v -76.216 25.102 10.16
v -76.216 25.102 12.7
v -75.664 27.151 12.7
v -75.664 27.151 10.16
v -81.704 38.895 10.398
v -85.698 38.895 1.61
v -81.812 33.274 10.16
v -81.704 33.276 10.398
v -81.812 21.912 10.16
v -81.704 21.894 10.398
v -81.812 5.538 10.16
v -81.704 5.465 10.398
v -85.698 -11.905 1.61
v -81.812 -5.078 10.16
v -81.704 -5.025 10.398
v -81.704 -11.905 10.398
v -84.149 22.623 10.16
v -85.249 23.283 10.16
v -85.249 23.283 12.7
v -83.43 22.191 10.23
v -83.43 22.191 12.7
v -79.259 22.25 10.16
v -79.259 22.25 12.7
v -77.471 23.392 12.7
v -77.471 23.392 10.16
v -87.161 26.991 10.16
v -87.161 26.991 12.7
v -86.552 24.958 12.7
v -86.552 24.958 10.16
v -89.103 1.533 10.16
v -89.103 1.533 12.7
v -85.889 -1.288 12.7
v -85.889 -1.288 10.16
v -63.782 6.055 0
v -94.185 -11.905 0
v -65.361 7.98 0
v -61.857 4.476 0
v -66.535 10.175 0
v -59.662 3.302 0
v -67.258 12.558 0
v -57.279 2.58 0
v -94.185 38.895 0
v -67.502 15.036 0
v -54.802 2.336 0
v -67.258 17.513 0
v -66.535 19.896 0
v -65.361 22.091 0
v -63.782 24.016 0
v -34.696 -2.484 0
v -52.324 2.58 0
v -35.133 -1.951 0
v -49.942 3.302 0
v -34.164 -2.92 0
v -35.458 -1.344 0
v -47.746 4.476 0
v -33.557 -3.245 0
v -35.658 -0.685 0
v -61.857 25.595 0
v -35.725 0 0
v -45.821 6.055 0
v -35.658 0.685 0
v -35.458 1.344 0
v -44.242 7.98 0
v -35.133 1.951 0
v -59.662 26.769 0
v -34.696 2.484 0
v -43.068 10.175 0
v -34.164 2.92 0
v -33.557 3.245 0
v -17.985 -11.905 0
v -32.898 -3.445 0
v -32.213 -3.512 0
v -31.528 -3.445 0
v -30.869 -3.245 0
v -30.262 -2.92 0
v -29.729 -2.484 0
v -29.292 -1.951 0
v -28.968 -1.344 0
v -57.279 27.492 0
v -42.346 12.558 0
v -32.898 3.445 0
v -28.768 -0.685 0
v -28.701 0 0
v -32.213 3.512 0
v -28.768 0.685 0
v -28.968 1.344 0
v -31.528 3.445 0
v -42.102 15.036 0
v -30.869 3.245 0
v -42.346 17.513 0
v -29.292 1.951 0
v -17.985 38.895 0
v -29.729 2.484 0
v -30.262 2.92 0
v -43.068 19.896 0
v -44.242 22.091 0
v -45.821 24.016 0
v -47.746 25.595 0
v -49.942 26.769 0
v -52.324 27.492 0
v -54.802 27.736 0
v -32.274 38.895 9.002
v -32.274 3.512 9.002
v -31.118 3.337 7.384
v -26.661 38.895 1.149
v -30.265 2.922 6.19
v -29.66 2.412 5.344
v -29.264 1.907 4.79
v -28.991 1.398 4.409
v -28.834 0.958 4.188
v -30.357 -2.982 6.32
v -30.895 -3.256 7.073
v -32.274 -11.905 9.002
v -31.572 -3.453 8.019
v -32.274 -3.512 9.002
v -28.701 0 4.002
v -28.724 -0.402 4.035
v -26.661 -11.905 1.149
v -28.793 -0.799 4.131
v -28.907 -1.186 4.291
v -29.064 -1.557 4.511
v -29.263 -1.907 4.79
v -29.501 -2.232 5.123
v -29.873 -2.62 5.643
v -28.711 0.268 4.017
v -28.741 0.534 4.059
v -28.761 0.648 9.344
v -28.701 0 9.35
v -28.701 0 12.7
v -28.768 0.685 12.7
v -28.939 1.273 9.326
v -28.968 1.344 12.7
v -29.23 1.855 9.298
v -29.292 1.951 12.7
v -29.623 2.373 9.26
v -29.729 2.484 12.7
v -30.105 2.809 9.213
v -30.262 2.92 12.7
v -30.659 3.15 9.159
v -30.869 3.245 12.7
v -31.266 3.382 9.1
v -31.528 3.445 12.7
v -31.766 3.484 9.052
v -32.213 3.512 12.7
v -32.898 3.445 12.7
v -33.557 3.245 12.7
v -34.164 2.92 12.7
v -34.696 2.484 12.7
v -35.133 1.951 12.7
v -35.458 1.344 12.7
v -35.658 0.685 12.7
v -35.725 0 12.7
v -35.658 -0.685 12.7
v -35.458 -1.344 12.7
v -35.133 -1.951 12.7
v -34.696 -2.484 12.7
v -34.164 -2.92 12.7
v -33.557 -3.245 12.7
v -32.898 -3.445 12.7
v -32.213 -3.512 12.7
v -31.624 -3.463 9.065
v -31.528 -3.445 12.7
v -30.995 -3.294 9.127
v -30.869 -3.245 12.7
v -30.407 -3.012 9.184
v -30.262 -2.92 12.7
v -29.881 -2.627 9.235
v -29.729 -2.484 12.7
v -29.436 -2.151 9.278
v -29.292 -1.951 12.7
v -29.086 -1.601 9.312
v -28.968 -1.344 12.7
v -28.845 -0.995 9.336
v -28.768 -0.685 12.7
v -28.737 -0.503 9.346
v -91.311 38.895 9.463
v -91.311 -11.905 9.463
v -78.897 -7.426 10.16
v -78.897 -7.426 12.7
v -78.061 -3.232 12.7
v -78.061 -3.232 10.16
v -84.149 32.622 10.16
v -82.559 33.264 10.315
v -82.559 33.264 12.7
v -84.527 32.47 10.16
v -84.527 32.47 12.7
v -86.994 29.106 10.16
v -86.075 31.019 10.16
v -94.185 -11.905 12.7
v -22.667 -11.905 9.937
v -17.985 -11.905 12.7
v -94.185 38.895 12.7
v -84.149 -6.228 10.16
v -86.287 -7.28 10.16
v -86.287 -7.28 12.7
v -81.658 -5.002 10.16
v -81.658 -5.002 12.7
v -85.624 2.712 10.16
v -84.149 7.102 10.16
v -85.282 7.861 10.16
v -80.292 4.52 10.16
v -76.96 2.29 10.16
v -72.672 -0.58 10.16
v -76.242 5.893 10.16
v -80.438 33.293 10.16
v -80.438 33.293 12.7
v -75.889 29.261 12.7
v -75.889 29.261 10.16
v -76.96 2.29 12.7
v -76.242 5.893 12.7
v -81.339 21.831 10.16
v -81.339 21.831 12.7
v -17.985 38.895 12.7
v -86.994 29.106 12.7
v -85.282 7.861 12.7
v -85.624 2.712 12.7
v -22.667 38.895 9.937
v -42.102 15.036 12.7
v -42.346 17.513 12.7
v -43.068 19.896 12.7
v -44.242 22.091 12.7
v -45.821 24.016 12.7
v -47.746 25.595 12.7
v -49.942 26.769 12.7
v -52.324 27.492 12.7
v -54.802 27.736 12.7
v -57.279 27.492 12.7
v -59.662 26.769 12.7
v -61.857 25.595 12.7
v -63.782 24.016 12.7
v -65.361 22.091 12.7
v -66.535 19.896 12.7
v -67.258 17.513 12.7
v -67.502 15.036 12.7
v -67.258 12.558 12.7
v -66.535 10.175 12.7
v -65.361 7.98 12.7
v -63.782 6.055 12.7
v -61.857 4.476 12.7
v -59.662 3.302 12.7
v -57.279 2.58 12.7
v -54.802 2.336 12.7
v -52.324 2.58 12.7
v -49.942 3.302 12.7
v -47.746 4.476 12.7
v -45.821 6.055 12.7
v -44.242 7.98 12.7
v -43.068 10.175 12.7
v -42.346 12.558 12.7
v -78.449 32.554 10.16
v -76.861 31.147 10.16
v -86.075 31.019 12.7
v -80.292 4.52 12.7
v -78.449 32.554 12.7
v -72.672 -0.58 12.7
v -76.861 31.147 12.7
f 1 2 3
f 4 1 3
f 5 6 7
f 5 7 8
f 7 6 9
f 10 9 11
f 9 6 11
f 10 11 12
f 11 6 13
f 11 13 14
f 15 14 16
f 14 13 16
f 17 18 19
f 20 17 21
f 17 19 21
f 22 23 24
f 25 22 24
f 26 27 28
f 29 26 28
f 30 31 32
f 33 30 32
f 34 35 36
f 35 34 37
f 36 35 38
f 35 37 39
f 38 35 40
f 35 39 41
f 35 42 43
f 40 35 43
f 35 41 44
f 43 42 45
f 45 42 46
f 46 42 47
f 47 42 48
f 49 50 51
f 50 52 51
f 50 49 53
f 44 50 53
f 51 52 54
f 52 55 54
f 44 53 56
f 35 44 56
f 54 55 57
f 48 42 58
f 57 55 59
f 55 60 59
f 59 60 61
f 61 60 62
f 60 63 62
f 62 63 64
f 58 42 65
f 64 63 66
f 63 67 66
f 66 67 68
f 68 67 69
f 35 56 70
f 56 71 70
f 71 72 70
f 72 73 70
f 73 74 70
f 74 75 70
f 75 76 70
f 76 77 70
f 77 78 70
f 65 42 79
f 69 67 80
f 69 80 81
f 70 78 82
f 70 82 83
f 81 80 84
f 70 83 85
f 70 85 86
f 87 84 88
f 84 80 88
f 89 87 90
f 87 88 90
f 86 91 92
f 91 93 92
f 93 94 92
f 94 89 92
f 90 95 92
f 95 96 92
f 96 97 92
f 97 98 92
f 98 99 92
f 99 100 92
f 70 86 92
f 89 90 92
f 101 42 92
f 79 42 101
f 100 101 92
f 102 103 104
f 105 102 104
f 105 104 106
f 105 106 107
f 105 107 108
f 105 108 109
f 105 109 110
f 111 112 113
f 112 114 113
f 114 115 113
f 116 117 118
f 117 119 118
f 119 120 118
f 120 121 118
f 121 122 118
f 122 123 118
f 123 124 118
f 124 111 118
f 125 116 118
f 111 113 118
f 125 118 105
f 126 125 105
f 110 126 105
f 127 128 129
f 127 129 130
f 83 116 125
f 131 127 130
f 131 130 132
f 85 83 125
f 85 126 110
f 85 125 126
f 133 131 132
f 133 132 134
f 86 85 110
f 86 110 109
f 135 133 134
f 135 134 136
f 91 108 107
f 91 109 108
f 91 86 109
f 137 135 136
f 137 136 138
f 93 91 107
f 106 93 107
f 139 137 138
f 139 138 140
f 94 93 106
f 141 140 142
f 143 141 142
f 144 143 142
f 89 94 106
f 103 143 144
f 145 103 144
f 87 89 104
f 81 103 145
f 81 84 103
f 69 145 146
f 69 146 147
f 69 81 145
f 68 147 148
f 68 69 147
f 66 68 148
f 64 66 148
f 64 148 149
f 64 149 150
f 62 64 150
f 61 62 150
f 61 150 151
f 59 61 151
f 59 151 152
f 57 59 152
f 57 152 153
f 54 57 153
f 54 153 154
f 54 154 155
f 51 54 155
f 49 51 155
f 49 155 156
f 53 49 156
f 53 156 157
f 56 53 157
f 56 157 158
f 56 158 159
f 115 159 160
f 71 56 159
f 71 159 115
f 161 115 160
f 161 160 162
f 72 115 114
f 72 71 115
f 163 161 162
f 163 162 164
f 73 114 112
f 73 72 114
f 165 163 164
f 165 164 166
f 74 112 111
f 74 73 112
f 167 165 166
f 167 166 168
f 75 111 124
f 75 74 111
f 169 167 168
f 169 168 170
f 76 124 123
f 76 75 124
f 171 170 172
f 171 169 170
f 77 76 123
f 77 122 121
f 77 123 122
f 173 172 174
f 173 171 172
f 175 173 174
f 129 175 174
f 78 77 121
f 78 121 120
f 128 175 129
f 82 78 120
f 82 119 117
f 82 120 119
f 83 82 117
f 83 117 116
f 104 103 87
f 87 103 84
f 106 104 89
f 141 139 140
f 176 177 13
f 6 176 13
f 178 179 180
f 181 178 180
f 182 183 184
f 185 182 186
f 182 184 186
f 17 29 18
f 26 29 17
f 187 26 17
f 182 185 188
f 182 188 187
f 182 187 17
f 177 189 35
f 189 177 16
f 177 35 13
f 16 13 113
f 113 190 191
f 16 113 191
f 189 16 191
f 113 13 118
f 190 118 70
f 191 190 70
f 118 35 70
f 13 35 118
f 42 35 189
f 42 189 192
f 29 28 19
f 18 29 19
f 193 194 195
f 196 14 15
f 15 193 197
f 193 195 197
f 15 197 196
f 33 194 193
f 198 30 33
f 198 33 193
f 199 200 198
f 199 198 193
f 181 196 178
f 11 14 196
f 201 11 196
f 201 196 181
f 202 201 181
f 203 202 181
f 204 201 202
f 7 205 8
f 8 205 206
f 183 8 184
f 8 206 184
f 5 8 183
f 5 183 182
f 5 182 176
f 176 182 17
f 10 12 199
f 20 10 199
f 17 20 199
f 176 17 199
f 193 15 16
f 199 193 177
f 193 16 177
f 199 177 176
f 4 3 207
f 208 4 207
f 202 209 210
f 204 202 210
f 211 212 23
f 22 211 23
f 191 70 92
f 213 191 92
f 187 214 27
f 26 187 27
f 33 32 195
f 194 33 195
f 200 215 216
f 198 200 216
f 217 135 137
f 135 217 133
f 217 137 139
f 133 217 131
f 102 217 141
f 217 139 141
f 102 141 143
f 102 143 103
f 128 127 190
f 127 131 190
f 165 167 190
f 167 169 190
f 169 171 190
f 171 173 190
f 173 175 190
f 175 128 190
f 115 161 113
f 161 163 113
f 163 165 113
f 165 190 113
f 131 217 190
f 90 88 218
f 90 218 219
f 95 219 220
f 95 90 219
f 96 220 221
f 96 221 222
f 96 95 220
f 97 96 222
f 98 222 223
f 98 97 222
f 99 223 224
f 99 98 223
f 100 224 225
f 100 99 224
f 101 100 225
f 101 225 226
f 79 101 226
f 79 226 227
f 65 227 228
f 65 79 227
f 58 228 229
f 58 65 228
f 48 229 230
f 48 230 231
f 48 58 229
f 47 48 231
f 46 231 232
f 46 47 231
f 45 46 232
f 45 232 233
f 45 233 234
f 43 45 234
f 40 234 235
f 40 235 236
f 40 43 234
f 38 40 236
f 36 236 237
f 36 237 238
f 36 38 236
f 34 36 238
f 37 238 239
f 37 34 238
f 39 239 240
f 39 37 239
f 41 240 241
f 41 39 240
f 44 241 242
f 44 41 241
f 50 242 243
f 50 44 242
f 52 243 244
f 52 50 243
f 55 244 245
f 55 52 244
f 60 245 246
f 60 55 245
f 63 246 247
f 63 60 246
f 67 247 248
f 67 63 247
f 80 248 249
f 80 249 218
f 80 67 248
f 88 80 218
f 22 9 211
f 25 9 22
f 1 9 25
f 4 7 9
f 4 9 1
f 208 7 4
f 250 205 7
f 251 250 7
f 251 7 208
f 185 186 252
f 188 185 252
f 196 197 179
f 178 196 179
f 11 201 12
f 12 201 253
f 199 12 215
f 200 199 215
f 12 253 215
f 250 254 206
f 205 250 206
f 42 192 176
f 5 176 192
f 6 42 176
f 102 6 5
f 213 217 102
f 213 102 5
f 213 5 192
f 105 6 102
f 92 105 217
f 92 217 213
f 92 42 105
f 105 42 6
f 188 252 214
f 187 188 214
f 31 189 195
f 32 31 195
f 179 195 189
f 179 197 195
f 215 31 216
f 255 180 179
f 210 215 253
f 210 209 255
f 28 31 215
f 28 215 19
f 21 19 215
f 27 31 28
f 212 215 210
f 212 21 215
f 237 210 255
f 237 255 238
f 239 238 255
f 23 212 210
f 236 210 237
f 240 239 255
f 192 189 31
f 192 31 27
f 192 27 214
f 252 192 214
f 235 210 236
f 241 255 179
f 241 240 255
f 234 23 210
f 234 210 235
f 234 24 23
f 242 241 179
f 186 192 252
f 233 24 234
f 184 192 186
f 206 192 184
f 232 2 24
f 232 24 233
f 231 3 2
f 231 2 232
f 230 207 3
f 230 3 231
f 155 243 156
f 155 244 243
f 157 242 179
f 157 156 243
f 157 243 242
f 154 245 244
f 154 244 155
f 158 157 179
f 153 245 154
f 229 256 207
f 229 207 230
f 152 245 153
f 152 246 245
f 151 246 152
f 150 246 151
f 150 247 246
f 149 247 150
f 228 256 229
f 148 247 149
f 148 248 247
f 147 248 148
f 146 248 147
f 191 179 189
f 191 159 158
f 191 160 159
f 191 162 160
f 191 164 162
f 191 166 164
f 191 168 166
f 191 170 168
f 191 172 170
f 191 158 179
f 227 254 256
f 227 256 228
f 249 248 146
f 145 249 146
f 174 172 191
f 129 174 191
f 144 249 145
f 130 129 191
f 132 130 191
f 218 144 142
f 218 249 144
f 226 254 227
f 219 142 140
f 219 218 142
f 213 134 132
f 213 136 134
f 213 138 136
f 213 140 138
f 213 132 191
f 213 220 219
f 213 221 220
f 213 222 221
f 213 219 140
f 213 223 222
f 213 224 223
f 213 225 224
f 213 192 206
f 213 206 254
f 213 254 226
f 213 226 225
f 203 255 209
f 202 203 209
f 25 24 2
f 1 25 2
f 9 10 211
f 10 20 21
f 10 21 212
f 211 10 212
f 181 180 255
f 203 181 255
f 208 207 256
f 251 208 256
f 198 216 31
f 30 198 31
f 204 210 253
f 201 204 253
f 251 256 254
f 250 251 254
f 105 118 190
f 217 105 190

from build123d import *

# Parameters (mm, degrees)
F0_W     = 76.2
F0_H     = 50.8
F0_R     = 3.5123065567
F0_R_2   = 12.7
F1_DEPTH = 12.7
F3_DEPTH = 2.54
F5_DEPTH = 50.8


with BuildPart() as f1:
    # F0 (on Top) → F1 (new body)
    with BuildSketch(Plane.XY):
        with Locations((-56.0851351521, 13.4954131208)):
            Rectangle(F0_W, F0_H)
        with Locations((-32.2128646076, 0)):
            Circle(F0_R, mode=Mode.SUBTRACT)
        with Locations((-54.8016801476, 15.0355538353)):
            Circle(F0_R_2, mode=Mode.SUBTRACT)
    extrude(amount=F1_DEPTH)

    # F2 (on face) → F3 (cut)
    with BuildSketch(Plane.XY.offset(12.7)):
        Polygon((-76.9599948415, 2.2896753244), (-80.2915843955, 4.5198883678), (-85.6237872068, 2.7123675299), (-85.8894135812, -1.2879801805), (-81.6579532121, -5.0020428543), (-78.0607372837, -3.2319081873), align=None)
        Polygon((-80.2915843955, 4.5198883678), (-85.281946506, 7.8605071594), (-85.6237872068, 2.7123675299), align=None)
        Polygon((-76.2417182173, 5.8927201535), (-80.2915843955, 4.5198883678), (-76.9599948415, 2.2896753244), align=None)
        Polygon((-72.6724954905, -0.5804372213), (-76.9599948415, 2.2896753244), (-78.0607372837, -3.2319081873), align=None)
        Polygon((-78.8967631712, -7.4256110723), (-78.0607372837, -3.2319081873), (-81.6579532121, -5.0020428543), align=None)
        Polygon((-81.6579532121, -5.0020428543), (-85.8894135812, -1.2879801805), (-86.2872932638, -7.2800699381), align=None)
        Polygon((-85.8894135812, -1.2879801805), (-85.6237872068, 2.7123675299), (-89.1032538719, 1.5328909188), align=None)
        Polygon((-84.5270859868, 32.4696852051), (-86.0750453988, 31.0185304322), (-86.9942569946, 29.1061814688), (-87.1605761549, 26.990911639), (-86.5515405552, 24.9583998544), (-85.2494038283, 23.2831480942), (-83.4300267543, 22.1914083914), (-81.3391262888, 21.8306262424), (-79.2590901256, 22.2495272756), (-77.4708386744, 23.3915365852), (-76.2158852028, 25.102419486), (-75.6637181311, 27.1511117617), (-75.8889106819, 29.2609261685), (-76.8610493535, 31.1469205797), (-78.4488414314, 32.5543809995), (-80.4378467972, 33.2932220992), (-82.5594392549, 33.2636592941), align=None)
    extrude(amount=-F3_DEPTH, mode=Mode.SUBTRACT)

    # F4 (on face) → F5 (cut)
    with BuildSketch(Plane.XZ.offset(11.9045868792)):
        Polygon((-26.6611795004, 1.1490697949), (-22.6668310289, 9.9366341741), (-32.2742592543, 9.0020592324), align=None)
        Polygon((-85.6983154144, 1.6102975211), (-81.7039669428, 10.3978619002), (-91.3113951683, 9.4632869586), align=None)
    extrude(amount=-F5_DEPTH, mode=Mode.SUBTRACT)


solid = f1.part
